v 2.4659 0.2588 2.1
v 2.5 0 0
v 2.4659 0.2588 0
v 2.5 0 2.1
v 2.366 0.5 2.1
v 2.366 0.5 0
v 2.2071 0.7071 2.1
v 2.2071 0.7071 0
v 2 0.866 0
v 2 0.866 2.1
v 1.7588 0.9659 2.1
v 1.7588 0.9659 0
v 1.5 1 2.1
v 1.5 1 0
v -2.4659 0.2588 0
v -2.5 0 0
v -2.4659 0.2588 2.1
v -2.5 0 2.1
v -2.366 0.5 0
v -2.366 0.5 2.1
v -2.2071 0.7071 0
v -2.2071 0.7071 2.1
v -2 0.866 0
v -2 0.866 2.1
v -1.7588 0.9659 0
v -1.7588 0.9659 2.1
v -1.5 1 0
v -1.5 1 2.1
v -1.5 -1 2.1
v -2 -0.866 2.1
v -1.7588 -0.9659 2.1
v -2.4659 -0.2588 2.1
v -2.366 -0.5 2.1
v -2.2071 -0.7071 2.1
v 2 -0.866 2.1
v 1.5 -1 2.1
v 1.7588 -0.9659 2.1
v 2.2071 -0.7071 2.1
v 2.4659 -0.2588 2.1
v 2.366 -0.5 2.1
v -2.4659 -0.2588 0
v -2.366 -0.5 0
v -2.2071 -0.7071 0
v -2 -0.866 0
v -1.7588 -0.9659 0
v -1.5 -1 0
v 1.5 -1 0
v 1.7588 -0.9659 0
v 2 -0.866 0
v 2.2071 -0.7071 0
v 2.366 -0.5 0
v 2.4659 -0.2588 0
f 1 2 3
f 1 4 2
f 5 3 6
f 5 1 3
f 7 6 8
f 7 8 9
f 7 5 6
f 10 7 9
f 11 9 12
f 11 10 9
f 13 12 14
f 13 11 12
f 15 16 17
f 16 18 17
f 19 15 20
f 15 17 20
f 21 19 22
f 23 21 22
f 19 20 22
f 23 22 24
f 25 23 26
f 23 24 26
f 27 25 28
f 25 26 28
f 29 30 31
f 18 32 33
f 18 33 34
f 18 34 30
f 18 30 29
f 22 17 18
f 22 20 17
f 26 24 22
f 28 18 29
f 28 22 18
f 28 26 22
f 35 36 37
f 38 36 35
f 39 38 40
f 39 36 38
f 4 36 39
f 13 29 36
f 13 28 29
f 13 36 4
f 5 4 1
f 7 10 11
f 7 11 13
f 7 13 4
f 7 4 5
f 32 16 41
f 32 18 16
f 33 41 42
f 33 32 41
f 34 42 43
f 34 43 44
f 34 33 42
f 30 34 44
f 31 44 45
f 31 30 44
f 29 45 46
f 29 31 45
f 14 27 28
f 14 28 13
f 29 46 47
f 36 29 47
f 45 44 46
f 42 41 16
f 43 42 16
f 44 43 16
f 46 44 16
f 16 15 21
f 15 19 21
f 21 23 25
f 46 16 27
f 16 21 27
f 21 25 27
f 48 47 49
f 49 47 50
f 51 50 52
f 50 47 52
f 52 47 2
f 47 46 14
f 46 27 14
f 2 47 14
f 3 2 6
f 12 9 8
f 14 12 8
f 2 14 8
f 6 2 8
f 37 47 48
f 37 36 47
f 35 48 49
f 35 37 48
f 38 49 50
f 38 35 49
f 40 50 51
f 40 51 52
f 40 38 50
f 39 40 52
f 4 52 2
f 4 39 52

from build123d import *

# Parameters (mm, degrees)
F0_W     = 5
F0_H     = 2
F1_DEPTH = 2.1
F2_R     = 0.99999


# Not quite as in the source:
# - a fillet or chamfer is up to 0.001 mm smaller than in the source, because OpenCascade refuses the exact size


with BuildPart() as f1:
    # F0 (on Top) → F1 (new body)
    with BuildSketch(Plane.XY):
        Rectangle(F0_W, F0_H)
    extrude(amount=F1_DEPTH)

    # F2 (radius 1 in the source; OpenCascade refuses exactly that, so slightly less here)
    f2_edges = [f1.edges().sort_by_distance(p)[0] for p in [
        (2.5, 1, 1.05),
        (2.5, -1, 1.05),
        (-2.5, -1, 1.05),
        (-2.5, 1, 1.05),
    ]]
    fillet(f2_edges, radius=F2_R)


solid = f1.part
